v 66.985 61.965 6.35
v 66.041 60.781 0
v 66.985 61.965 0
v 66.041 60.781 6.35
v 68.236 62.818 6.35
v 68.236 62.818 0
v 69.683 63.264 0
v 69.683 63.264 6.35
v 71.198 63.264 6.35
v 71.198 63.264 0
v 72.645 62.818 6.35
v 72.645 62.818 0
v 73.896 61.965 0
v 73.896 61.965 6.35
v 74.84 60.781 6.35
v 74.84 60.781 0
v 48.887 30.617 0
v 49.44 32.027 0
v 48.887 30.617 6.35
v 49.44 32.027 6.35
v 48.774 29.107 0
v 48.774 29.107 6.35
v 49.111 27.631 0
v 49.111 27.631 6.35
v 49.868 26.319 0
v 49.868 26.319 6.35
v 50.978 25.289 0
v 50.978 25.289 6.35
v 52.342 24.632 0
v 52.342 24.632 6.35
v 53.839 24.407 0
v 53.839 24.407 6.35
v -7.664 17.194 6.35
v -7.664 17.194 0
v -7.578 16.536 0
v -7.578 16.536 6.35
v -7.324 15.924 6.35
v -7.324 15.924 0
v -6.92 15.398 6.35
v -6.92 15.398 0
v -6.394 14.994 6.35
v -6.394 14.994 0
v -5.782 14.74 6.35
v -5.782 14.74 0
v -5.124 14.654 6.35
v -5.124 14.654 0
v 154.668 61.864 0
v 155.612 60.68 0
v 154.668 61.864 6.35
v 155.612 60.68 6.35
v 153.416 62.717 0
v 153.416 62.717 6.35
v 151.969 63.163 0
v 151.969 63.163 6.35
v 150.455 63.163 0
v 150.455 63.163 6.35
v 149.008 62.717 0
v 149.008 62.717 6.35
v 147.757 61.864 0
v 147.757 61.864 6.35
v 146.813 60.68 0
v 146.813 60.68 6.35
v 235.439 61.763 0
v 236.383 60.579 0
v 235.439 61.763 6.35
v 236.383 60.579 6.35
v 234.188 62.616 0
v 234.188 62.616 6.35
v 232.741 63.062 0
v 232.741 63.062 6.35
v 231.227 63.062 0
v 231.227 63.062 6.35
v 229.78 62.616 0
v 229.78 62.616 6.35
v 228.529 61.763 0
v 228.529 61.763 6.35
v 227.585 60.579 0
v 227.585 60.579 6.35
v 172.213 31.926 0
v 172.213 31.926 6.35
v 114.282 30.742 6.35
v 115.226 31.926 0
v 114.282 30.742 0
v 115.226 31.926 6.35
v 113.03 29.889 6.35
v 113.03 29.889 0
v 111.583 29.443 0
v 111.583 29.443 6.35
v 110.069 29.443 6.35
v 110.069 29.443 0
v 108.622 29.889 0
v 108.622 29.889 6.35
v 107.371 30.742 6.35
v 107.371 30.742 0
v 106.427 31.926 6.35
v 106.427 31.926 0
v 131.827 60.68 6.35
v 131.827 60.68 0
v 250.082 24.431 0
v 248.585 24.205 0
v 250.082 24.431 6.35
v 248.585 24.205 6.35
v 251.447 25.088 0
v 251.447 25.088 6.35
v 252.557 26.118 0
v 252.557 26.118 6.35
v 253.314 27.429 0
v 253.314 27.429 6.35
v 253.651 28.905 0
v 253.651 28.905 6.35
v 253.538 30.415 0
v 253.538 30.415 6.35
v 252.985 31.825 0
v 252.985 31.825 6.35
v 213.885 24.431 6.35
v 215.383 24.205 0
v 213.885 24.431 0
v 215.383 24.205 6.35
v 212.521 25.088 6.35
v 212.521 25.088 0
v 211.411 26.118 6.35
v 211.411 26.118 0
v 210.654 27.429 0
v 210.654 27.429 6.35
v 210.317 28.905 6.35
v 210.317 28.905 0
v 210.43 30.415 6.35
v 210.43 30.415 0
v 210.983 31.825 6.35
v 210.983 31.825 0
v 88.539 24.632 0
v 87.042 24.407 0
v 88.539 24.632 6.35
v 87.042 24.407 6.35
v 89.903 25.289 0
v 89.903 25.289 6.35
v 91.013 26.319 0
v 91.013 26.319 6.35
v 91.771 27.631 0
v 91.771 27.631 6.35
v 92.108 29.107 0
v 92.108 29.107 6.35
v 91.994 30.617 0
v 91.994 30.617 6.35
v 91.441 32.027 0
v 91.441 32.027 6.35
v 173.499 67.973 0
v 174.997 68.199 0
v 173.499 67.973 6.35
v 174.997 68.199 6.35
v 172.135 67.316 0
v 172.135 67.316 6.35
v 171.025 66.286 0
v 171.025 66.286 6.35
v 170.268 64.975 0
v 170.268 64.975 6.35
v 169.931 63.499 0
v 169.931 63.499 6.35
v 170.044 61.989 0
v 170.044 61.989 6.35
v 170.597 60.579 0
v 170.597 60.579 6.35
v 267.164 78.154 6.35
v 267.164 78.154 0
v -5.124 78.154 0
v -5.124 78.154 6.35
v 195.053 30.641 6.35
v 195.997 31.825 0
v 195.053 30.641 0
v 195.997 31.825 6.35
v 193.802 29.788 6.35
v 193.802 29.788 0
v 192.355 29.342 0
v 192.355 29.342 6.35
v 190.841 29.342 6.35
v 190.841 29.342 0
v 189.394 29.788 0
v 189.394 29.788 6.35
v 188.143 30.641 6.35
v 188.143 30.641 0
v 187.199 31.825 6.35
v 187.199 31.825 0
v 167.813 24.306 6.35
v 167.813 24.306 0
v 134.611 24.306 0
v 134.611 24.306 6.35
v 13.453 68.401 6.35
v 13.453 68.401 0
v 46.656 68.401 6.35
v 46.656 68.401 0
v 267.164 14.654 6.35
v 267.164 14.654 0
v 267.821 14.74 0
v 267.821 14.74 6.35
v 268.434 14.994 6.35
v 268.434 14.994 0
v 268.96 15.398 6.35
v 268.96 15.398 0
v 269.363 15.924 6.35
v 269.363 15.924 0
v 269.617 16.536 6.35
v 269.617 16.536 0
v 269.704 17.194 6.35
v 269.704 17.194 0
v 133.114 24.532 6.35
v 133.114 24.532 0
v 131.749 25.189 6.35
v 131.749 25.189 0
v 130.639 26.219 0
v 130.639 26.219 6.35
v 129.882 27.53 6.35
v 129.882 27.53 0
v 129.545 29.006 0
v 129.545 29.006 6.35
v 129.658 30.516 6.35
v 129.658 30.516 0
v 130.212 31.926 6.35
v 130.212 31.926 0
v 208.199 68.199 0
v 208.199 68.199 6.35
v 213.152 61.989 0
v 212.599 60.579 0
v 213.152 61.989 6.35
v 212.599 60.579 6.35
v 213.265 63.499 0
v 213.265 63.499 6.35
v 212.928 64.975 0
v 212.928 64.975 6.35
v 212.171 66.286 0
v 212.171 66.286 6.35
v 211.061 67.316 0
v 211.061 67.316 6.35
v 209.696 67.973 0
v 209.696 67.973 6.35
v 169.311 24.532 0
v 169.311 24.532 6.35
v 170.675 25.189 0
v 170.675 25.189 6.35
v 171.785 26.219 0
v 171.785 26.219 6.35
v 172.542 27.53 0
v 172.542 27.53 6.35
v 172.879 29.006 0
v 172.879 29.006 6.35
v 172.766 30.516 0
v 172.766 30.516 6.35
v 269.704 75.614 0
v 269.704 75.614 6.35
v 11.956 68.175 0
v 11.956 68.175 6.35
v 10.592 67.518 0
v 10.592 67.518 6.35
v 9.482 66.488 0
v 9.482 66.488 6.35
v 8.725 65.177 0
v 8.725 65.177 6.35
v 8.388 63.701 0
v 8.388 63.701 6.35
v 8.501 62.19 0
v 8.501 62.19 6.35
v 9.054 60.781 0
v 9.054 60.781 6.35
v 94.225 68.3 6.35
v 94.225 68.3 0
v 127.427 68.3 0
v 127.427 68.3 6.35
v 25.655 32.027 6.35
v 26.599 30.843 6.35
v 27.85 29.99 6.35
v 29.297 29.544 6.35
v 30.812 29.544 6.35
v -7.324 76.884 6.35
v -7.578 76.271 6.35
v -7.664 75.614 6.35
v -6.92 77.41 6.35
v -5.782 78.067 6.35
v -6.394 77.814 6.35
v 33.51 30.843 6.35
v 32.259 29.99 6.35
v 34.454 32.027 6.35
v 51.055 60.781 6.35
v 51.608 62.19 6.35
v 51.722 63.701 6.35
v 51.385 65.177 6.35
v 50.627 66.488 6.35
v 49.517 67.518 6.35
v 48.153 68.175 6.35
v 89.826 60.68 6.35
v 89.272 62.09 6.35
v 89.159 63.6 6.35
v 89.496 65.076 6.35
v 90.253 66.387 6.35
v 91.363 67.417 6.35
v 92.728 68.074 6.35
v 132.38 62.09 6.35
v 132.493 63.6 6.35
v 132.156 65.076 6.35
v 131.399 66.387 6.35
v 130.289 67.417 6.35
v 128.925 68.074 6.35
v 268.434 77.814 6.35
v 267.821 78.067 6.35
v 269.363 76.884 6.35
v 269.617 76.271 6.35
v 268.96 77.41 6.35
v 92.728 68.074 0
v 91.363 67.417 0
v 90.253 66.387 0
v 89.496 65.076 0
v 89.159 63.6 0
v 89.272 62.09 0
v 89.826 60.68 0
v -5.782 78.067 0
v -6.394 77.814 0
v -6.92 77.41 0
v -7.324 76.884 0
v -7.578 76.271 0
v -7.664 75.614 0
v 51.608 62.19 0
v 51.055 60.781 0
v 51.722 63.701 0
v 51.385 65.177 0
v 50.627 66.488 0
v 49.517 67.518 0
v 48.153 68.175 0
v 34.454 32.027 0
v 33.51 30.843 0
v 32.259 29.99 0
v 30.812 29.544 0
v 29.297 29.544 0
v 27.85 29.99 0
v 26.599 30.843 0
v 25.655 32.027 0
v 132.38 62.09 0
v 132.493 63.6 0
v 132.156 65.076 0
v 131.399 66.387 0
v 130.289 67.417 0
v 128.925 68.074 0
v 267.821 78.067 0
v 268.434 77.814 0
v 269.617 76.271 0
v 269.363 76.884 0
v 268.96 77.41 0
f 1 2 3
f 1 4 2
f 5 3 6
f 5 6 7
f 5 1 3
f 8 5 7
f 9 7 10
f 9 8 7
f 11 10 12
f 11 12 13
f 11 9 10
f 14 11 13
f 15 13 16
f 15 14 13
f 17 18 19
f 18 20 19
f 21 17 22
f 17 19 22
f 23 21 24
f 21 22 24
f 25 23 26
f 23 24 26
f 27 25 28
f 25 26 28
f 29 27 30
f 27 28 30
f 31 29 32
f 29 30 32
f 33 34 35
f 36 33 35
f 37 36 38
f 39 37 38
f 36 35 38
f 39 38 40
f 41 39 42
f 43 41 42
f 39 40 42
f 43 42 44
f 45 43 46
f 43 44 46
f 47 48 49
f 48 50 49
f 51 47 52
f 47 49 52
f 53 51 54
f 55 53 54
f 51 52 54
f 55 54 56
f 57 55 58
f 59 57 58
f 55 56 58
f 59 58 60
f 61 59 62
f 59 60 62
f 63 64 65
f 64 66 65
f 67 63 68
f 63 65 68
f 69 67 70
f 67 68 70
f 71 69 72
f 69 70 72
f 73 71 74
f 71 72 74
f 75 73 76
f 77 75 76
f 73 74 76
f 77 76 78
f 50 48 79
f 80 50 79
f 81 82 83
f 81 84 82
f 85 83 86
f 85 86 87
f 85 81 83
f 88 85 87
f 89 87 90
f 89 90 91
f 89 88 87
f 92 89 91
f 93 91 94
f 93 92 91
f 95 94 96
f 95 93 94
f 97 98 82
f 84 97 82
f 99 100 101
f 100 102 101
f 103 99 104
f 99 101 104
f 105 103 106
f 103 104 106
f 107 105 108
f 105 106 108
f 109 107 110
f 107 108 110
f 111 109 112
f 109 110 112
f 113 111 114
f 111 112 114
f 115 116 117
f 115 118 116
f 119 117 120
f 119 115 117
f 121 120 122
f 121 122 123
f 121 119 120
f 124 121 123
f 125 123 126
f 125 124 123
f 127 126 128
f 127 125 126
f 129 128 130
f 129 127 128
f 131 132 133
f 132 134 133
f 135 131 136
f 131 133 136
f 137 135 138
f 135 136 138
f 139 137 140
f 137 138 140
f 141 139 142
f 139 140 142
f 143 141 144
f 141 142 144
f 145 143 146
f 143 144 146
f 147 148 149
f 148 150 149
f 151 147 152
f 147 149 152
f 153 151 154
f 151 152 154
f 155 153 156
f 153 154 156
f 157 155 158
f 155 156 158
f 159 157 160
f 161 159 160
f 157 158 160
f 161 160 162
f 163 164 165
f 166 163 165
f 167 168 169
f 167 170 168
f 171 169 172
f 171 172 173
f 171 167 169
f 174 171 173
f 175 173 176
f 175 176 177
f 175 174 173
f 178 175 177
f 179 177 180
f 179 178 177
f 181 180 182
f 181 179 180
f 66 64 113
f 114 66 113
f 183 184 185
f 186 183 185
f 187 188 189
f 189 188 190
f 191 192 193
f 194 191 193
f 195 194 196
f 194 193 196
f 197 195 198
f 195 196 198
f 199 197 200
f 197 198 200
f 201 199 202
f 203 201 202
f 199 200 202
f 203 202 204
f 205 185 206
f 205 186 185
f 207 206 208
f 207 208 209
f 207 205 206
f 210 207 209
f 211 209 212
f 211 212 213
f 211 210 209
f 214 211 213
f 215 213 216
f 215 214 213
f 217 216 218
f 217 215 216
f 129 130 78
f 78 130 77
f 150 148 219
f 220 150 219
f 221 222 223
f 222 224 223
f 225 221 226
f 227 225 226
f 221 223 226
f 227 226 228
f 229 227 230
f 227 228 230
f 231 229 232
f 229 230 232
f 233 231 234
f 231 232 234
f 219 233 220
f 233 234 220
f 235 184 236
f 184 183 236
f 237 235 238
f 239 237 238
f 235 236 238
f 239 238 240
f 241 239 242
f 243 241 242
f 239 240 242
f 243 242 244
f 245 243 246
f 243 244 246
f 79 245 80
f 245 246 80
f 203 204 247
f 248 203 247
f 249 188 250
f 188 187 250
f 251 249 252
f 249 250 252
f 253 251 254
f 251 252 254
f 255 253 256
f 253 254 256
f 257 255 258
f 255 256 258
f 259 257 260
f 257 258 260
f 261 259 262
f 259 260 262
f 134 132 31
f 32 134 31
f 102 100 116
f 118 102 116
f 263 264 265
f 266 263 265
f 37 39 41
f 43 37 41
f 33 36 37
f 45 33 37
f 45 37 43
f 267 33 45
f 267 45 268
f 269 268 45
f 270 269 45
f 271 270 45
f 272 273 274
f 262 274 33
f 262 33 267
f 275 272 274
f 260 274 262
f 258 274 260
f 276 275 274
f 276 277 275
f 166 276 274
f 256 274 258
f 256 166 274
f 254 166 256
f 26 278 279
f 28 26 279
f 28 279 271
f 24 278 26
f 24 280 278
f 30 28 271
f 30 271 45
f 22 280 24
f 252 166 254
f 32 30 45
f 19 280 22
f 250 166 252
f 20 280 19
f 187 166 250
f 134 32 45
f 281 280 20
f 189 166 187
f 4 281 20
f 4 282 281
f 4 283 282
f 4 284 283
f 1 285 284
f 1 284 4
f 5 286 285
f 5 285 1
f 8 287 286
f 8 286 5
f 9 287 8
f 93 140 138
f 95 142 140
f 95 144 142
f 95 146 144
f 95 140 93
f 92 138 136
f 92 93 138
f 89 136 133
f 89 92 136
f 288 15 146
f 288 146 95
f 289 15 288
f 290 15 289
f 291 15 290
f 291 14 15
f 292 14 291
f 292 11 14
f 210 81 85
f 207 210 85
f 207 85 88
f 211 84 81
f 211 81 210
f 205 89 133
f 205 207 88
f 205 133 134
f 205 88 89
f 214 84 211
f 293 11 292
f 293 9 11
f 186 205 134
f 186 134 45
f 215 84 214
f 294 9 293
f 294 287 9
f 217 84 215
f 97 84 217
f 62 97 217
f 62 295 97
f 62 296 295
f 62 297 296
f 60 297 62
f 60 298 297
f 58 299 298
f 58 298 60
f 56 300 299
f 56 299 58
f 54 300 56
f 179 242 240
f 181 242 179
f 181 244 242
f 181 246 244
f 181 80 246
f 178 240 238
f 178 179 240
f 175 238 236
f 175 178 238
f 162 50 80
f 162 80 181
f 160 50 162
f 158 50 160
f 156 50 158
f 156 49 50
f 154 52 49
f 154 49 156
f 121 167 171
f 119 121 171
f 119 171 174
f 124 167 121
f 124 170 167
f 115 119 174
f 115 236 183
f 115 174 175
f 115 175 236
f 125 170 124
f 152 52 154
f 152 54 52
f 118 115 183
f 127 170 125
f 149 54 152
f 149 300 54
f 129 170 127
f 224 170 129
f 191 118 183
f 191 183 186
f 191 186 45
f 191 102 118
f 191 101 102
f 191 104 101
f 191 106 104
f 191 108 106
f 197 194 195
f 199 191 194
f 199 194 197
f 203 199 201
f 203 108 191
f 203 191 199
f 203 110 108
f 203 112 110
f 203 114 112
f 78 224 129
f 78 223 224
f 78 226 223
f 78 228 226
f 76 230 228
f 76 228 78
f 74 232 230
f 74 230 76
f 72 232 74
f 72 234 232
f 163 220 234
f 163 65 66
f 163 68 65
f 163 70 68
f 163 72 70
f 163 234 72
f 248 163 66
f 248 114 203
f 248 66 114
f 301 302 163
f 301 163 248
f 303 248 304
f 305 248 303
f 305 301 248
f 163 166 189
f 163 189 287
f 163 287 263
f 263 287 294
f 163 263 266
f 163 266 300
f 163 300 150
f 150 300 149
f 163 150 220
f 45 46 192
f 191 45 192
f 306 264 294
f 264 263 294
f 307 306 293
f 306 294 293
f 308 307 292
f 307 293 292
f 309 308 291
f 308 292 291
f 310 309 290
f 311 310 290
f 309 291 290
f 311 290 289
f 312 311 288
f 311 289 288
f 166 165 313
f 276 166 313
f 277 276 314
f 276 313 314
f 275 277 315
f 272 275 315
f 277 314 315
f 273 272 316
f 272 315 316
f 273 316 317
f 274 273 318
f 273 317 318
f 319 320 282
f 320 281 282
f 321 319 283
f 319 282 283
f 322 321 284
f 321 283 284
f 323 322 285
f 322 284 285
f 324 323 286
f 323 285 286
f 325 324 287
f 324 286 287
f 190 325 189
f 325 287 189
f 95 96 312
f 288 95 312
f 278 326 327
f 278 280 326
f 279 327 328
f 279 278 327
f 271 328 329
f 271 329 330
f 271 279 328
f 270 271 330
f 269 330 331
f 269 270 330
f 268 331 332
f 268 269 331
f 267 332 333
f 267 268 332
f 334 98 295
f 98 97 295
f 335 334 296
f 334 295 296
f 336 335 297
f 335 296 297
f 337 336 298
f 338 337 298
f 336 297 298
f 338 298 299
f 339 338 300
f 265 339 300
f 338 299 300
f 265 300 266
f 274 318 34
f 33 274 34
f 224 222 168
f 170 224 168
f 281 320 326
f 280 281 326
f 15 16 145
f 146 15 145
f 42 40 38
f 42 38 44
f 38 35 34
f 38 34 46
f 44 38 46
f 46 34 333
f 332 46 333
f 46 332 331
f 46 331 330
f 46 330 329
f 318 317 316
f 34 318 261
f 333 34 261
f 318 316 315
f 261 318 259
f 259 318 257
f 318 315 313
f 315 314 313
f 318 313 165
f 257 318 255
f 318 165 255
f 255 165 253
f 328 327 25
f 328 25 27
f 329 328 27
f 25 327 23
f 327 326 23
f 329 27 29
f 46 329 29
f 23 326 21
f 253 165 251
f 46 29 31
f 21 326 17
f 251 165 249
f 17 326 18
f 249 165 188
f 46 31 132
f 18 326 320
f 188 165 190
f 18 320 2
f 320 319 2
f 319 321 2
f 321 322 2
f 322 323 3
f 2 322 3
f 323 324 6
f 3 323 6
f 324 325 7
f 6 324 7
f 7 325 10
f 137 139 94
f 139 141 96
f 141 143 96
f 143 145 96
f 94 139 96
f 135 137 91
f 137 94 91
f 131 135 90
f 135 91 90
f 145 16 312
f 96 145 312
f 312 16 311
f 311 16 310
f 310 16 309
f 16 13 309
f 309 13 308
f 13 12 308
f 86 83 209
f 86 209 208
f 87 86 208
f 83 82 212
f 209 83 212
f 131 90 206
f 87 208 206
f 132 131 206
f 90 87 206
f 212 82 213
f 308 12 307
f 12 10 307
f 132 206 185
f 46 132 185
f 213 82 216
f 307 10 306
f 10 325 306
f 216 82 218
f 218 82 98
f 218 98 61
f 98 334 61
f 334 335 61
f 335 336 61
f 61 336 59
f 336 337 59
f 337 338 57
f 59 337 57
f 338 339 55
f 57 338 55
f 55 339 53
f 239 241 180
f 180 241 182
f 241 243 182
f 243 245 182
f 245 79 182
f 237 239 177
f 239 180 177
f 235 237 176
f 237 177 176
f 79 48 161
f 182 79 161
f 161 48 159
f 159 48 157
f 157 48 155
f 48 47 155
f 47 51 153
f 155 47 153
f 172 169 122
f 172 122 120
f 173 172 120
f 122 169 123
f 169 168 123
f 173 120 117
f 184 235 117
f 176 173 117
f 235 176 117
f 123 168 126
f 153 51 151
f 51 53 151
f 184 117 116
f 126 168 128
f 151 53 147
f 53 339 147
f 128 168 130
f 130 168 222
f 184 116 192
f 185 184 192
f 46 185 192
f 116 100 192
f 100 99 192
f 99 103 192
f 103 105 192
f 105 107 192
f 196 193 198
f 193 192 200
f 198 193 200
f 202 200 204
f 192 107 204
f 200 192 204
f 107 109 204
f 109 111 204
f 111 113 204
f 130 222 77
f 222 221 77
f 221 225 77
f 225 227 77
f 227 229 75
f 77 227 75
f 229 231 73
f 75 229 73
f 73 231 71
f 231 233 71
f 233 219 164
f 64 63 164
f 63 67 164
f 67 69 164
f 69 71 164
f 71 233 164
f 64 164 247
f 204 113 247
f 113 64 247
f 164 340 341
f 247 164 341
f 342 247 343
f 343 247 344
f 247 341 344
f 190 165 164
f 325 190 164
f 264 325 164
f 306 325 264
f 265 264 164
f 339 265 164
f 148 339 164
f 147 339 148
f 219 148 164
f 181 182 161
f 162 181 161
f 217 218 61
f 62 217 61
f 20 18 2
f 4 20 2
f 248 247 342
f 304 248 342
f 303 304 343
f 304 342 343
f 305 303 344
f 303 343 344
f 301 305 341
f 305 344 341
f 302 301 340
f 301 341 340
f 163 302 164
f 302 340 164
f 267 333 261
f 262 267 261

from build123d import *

# Parameters (mm, degrees)
BOSS_EXTRUDE1_DEPTH = 6.35
FILLET1_R           = 5.08


with BuildPart() as part:
    # Sketch2 → Boss-Extrude1 (new body)
    with BuildSketch(Plane.XY):
        with BuildLine():
            Line((-5.12438972, 14.653837172), (267.16361028, 14.653837172))
            ThreePointArc((267.16361028, 14.653837172), (268.959661504, 15.397785947), (269.70361028, 17.193837172))
            Line((269.70361028, 17.193837172), (269.70361028, 75.613837172))
            ThreePointArc((269.70361028, 75.613837172), (268.959661504, 77.409888396), (267.16361028, 78.153837172))
            Line((267.16361028, 78.153837172), (-5.12438972, 78.153837172))
            ThreePointArc((-5.12438972, 78.153837172), (-6.920440944, 77.409888396), (-7.66438972, 75.613837172))
            Line((-7.66438972, 75.613837172), (-7.66438972, 17.193837172))
            ThreePointArc((-7.66438972, 17.193837172), (-6.920440944, 15.397785947), (-5.12438972, 14.653837172))
        make_face()
        Polygon((30.05461028, 24.406794359), (4.65461028, 68.400884872), (55.45461028, 68.400884872), align=None, mode=Mode.SUBTRACT)
        Polygon((70.44061028, 68.400882428), (95.84061028, 24.406791915), (45.04061028, 24.406791915), align=None, mode=Mode.SUBTRACT)
        Polygon((110.82627023, 24.305837172), (85.42627023, 68.299927684), (136.22627023, 68.299927684), align=None, mode=Mode.SUBTRACT)
        Polygon((125.81227023, 24.305834728), (151.21227023, 68.29992524), (176.61227023, 24.305834728), align=None, mode=Mode.SUBTRACT)
        Polygon((191.59793018, 24.204879984), (166.19793018, 68.198970496), (216.99793018, 68.198970496), align=None, mode=Mode.SUBTRACT)
        Polygon((206.58393018, 24.20487754), (231.98393018, 68.198968052), (257.38393018, 24.20487754), align=None, mode=Mode.SUBTRACT)
    extrude(amount=BOSS_EXTRUDE1_DEPTH)

    # Fillet1
    fillet1_edges = [part.edges().sort_by_distance(p)[0] for p in [
        (257.38393018, 24.20487754, 3.175),
        (231.98393018, 68.198968052, 3.175),
        (206.58393018, 24.20487754, 3.175),
        (176.61227023, 24.305834728, 3.175),
        (151.21227023, 68.29992524, 3.175),
        (125.81227023, 24.305834728, 3.175),
        (4.65461028, 68.400884872, 3.175),
        (30.05461028, 24.406794359, 3.175),
        (55.45461028, 68.400884872, 3.175),
        (95.84061028, 24.406791915, 3.175),
        (70.44061028, 68.400882428, 3.175),
        (45.04061028, 24.406791915, 3.175),
        (85.42627023, 68.299927684, 3.175),
        (110.82627023, 24.305837172, 3.175),
        (136.22627023, 68.299927684, 3.175),
        (166.19793018, 68.198970496, 3.175),
        (191.59793018, 24.204879984, 3.175),
        (216.99793018, 68.198970496, 3.175),
    ]]
    fillet(fillet1_edges, radius=FILLET1_R)


solid = part.part
